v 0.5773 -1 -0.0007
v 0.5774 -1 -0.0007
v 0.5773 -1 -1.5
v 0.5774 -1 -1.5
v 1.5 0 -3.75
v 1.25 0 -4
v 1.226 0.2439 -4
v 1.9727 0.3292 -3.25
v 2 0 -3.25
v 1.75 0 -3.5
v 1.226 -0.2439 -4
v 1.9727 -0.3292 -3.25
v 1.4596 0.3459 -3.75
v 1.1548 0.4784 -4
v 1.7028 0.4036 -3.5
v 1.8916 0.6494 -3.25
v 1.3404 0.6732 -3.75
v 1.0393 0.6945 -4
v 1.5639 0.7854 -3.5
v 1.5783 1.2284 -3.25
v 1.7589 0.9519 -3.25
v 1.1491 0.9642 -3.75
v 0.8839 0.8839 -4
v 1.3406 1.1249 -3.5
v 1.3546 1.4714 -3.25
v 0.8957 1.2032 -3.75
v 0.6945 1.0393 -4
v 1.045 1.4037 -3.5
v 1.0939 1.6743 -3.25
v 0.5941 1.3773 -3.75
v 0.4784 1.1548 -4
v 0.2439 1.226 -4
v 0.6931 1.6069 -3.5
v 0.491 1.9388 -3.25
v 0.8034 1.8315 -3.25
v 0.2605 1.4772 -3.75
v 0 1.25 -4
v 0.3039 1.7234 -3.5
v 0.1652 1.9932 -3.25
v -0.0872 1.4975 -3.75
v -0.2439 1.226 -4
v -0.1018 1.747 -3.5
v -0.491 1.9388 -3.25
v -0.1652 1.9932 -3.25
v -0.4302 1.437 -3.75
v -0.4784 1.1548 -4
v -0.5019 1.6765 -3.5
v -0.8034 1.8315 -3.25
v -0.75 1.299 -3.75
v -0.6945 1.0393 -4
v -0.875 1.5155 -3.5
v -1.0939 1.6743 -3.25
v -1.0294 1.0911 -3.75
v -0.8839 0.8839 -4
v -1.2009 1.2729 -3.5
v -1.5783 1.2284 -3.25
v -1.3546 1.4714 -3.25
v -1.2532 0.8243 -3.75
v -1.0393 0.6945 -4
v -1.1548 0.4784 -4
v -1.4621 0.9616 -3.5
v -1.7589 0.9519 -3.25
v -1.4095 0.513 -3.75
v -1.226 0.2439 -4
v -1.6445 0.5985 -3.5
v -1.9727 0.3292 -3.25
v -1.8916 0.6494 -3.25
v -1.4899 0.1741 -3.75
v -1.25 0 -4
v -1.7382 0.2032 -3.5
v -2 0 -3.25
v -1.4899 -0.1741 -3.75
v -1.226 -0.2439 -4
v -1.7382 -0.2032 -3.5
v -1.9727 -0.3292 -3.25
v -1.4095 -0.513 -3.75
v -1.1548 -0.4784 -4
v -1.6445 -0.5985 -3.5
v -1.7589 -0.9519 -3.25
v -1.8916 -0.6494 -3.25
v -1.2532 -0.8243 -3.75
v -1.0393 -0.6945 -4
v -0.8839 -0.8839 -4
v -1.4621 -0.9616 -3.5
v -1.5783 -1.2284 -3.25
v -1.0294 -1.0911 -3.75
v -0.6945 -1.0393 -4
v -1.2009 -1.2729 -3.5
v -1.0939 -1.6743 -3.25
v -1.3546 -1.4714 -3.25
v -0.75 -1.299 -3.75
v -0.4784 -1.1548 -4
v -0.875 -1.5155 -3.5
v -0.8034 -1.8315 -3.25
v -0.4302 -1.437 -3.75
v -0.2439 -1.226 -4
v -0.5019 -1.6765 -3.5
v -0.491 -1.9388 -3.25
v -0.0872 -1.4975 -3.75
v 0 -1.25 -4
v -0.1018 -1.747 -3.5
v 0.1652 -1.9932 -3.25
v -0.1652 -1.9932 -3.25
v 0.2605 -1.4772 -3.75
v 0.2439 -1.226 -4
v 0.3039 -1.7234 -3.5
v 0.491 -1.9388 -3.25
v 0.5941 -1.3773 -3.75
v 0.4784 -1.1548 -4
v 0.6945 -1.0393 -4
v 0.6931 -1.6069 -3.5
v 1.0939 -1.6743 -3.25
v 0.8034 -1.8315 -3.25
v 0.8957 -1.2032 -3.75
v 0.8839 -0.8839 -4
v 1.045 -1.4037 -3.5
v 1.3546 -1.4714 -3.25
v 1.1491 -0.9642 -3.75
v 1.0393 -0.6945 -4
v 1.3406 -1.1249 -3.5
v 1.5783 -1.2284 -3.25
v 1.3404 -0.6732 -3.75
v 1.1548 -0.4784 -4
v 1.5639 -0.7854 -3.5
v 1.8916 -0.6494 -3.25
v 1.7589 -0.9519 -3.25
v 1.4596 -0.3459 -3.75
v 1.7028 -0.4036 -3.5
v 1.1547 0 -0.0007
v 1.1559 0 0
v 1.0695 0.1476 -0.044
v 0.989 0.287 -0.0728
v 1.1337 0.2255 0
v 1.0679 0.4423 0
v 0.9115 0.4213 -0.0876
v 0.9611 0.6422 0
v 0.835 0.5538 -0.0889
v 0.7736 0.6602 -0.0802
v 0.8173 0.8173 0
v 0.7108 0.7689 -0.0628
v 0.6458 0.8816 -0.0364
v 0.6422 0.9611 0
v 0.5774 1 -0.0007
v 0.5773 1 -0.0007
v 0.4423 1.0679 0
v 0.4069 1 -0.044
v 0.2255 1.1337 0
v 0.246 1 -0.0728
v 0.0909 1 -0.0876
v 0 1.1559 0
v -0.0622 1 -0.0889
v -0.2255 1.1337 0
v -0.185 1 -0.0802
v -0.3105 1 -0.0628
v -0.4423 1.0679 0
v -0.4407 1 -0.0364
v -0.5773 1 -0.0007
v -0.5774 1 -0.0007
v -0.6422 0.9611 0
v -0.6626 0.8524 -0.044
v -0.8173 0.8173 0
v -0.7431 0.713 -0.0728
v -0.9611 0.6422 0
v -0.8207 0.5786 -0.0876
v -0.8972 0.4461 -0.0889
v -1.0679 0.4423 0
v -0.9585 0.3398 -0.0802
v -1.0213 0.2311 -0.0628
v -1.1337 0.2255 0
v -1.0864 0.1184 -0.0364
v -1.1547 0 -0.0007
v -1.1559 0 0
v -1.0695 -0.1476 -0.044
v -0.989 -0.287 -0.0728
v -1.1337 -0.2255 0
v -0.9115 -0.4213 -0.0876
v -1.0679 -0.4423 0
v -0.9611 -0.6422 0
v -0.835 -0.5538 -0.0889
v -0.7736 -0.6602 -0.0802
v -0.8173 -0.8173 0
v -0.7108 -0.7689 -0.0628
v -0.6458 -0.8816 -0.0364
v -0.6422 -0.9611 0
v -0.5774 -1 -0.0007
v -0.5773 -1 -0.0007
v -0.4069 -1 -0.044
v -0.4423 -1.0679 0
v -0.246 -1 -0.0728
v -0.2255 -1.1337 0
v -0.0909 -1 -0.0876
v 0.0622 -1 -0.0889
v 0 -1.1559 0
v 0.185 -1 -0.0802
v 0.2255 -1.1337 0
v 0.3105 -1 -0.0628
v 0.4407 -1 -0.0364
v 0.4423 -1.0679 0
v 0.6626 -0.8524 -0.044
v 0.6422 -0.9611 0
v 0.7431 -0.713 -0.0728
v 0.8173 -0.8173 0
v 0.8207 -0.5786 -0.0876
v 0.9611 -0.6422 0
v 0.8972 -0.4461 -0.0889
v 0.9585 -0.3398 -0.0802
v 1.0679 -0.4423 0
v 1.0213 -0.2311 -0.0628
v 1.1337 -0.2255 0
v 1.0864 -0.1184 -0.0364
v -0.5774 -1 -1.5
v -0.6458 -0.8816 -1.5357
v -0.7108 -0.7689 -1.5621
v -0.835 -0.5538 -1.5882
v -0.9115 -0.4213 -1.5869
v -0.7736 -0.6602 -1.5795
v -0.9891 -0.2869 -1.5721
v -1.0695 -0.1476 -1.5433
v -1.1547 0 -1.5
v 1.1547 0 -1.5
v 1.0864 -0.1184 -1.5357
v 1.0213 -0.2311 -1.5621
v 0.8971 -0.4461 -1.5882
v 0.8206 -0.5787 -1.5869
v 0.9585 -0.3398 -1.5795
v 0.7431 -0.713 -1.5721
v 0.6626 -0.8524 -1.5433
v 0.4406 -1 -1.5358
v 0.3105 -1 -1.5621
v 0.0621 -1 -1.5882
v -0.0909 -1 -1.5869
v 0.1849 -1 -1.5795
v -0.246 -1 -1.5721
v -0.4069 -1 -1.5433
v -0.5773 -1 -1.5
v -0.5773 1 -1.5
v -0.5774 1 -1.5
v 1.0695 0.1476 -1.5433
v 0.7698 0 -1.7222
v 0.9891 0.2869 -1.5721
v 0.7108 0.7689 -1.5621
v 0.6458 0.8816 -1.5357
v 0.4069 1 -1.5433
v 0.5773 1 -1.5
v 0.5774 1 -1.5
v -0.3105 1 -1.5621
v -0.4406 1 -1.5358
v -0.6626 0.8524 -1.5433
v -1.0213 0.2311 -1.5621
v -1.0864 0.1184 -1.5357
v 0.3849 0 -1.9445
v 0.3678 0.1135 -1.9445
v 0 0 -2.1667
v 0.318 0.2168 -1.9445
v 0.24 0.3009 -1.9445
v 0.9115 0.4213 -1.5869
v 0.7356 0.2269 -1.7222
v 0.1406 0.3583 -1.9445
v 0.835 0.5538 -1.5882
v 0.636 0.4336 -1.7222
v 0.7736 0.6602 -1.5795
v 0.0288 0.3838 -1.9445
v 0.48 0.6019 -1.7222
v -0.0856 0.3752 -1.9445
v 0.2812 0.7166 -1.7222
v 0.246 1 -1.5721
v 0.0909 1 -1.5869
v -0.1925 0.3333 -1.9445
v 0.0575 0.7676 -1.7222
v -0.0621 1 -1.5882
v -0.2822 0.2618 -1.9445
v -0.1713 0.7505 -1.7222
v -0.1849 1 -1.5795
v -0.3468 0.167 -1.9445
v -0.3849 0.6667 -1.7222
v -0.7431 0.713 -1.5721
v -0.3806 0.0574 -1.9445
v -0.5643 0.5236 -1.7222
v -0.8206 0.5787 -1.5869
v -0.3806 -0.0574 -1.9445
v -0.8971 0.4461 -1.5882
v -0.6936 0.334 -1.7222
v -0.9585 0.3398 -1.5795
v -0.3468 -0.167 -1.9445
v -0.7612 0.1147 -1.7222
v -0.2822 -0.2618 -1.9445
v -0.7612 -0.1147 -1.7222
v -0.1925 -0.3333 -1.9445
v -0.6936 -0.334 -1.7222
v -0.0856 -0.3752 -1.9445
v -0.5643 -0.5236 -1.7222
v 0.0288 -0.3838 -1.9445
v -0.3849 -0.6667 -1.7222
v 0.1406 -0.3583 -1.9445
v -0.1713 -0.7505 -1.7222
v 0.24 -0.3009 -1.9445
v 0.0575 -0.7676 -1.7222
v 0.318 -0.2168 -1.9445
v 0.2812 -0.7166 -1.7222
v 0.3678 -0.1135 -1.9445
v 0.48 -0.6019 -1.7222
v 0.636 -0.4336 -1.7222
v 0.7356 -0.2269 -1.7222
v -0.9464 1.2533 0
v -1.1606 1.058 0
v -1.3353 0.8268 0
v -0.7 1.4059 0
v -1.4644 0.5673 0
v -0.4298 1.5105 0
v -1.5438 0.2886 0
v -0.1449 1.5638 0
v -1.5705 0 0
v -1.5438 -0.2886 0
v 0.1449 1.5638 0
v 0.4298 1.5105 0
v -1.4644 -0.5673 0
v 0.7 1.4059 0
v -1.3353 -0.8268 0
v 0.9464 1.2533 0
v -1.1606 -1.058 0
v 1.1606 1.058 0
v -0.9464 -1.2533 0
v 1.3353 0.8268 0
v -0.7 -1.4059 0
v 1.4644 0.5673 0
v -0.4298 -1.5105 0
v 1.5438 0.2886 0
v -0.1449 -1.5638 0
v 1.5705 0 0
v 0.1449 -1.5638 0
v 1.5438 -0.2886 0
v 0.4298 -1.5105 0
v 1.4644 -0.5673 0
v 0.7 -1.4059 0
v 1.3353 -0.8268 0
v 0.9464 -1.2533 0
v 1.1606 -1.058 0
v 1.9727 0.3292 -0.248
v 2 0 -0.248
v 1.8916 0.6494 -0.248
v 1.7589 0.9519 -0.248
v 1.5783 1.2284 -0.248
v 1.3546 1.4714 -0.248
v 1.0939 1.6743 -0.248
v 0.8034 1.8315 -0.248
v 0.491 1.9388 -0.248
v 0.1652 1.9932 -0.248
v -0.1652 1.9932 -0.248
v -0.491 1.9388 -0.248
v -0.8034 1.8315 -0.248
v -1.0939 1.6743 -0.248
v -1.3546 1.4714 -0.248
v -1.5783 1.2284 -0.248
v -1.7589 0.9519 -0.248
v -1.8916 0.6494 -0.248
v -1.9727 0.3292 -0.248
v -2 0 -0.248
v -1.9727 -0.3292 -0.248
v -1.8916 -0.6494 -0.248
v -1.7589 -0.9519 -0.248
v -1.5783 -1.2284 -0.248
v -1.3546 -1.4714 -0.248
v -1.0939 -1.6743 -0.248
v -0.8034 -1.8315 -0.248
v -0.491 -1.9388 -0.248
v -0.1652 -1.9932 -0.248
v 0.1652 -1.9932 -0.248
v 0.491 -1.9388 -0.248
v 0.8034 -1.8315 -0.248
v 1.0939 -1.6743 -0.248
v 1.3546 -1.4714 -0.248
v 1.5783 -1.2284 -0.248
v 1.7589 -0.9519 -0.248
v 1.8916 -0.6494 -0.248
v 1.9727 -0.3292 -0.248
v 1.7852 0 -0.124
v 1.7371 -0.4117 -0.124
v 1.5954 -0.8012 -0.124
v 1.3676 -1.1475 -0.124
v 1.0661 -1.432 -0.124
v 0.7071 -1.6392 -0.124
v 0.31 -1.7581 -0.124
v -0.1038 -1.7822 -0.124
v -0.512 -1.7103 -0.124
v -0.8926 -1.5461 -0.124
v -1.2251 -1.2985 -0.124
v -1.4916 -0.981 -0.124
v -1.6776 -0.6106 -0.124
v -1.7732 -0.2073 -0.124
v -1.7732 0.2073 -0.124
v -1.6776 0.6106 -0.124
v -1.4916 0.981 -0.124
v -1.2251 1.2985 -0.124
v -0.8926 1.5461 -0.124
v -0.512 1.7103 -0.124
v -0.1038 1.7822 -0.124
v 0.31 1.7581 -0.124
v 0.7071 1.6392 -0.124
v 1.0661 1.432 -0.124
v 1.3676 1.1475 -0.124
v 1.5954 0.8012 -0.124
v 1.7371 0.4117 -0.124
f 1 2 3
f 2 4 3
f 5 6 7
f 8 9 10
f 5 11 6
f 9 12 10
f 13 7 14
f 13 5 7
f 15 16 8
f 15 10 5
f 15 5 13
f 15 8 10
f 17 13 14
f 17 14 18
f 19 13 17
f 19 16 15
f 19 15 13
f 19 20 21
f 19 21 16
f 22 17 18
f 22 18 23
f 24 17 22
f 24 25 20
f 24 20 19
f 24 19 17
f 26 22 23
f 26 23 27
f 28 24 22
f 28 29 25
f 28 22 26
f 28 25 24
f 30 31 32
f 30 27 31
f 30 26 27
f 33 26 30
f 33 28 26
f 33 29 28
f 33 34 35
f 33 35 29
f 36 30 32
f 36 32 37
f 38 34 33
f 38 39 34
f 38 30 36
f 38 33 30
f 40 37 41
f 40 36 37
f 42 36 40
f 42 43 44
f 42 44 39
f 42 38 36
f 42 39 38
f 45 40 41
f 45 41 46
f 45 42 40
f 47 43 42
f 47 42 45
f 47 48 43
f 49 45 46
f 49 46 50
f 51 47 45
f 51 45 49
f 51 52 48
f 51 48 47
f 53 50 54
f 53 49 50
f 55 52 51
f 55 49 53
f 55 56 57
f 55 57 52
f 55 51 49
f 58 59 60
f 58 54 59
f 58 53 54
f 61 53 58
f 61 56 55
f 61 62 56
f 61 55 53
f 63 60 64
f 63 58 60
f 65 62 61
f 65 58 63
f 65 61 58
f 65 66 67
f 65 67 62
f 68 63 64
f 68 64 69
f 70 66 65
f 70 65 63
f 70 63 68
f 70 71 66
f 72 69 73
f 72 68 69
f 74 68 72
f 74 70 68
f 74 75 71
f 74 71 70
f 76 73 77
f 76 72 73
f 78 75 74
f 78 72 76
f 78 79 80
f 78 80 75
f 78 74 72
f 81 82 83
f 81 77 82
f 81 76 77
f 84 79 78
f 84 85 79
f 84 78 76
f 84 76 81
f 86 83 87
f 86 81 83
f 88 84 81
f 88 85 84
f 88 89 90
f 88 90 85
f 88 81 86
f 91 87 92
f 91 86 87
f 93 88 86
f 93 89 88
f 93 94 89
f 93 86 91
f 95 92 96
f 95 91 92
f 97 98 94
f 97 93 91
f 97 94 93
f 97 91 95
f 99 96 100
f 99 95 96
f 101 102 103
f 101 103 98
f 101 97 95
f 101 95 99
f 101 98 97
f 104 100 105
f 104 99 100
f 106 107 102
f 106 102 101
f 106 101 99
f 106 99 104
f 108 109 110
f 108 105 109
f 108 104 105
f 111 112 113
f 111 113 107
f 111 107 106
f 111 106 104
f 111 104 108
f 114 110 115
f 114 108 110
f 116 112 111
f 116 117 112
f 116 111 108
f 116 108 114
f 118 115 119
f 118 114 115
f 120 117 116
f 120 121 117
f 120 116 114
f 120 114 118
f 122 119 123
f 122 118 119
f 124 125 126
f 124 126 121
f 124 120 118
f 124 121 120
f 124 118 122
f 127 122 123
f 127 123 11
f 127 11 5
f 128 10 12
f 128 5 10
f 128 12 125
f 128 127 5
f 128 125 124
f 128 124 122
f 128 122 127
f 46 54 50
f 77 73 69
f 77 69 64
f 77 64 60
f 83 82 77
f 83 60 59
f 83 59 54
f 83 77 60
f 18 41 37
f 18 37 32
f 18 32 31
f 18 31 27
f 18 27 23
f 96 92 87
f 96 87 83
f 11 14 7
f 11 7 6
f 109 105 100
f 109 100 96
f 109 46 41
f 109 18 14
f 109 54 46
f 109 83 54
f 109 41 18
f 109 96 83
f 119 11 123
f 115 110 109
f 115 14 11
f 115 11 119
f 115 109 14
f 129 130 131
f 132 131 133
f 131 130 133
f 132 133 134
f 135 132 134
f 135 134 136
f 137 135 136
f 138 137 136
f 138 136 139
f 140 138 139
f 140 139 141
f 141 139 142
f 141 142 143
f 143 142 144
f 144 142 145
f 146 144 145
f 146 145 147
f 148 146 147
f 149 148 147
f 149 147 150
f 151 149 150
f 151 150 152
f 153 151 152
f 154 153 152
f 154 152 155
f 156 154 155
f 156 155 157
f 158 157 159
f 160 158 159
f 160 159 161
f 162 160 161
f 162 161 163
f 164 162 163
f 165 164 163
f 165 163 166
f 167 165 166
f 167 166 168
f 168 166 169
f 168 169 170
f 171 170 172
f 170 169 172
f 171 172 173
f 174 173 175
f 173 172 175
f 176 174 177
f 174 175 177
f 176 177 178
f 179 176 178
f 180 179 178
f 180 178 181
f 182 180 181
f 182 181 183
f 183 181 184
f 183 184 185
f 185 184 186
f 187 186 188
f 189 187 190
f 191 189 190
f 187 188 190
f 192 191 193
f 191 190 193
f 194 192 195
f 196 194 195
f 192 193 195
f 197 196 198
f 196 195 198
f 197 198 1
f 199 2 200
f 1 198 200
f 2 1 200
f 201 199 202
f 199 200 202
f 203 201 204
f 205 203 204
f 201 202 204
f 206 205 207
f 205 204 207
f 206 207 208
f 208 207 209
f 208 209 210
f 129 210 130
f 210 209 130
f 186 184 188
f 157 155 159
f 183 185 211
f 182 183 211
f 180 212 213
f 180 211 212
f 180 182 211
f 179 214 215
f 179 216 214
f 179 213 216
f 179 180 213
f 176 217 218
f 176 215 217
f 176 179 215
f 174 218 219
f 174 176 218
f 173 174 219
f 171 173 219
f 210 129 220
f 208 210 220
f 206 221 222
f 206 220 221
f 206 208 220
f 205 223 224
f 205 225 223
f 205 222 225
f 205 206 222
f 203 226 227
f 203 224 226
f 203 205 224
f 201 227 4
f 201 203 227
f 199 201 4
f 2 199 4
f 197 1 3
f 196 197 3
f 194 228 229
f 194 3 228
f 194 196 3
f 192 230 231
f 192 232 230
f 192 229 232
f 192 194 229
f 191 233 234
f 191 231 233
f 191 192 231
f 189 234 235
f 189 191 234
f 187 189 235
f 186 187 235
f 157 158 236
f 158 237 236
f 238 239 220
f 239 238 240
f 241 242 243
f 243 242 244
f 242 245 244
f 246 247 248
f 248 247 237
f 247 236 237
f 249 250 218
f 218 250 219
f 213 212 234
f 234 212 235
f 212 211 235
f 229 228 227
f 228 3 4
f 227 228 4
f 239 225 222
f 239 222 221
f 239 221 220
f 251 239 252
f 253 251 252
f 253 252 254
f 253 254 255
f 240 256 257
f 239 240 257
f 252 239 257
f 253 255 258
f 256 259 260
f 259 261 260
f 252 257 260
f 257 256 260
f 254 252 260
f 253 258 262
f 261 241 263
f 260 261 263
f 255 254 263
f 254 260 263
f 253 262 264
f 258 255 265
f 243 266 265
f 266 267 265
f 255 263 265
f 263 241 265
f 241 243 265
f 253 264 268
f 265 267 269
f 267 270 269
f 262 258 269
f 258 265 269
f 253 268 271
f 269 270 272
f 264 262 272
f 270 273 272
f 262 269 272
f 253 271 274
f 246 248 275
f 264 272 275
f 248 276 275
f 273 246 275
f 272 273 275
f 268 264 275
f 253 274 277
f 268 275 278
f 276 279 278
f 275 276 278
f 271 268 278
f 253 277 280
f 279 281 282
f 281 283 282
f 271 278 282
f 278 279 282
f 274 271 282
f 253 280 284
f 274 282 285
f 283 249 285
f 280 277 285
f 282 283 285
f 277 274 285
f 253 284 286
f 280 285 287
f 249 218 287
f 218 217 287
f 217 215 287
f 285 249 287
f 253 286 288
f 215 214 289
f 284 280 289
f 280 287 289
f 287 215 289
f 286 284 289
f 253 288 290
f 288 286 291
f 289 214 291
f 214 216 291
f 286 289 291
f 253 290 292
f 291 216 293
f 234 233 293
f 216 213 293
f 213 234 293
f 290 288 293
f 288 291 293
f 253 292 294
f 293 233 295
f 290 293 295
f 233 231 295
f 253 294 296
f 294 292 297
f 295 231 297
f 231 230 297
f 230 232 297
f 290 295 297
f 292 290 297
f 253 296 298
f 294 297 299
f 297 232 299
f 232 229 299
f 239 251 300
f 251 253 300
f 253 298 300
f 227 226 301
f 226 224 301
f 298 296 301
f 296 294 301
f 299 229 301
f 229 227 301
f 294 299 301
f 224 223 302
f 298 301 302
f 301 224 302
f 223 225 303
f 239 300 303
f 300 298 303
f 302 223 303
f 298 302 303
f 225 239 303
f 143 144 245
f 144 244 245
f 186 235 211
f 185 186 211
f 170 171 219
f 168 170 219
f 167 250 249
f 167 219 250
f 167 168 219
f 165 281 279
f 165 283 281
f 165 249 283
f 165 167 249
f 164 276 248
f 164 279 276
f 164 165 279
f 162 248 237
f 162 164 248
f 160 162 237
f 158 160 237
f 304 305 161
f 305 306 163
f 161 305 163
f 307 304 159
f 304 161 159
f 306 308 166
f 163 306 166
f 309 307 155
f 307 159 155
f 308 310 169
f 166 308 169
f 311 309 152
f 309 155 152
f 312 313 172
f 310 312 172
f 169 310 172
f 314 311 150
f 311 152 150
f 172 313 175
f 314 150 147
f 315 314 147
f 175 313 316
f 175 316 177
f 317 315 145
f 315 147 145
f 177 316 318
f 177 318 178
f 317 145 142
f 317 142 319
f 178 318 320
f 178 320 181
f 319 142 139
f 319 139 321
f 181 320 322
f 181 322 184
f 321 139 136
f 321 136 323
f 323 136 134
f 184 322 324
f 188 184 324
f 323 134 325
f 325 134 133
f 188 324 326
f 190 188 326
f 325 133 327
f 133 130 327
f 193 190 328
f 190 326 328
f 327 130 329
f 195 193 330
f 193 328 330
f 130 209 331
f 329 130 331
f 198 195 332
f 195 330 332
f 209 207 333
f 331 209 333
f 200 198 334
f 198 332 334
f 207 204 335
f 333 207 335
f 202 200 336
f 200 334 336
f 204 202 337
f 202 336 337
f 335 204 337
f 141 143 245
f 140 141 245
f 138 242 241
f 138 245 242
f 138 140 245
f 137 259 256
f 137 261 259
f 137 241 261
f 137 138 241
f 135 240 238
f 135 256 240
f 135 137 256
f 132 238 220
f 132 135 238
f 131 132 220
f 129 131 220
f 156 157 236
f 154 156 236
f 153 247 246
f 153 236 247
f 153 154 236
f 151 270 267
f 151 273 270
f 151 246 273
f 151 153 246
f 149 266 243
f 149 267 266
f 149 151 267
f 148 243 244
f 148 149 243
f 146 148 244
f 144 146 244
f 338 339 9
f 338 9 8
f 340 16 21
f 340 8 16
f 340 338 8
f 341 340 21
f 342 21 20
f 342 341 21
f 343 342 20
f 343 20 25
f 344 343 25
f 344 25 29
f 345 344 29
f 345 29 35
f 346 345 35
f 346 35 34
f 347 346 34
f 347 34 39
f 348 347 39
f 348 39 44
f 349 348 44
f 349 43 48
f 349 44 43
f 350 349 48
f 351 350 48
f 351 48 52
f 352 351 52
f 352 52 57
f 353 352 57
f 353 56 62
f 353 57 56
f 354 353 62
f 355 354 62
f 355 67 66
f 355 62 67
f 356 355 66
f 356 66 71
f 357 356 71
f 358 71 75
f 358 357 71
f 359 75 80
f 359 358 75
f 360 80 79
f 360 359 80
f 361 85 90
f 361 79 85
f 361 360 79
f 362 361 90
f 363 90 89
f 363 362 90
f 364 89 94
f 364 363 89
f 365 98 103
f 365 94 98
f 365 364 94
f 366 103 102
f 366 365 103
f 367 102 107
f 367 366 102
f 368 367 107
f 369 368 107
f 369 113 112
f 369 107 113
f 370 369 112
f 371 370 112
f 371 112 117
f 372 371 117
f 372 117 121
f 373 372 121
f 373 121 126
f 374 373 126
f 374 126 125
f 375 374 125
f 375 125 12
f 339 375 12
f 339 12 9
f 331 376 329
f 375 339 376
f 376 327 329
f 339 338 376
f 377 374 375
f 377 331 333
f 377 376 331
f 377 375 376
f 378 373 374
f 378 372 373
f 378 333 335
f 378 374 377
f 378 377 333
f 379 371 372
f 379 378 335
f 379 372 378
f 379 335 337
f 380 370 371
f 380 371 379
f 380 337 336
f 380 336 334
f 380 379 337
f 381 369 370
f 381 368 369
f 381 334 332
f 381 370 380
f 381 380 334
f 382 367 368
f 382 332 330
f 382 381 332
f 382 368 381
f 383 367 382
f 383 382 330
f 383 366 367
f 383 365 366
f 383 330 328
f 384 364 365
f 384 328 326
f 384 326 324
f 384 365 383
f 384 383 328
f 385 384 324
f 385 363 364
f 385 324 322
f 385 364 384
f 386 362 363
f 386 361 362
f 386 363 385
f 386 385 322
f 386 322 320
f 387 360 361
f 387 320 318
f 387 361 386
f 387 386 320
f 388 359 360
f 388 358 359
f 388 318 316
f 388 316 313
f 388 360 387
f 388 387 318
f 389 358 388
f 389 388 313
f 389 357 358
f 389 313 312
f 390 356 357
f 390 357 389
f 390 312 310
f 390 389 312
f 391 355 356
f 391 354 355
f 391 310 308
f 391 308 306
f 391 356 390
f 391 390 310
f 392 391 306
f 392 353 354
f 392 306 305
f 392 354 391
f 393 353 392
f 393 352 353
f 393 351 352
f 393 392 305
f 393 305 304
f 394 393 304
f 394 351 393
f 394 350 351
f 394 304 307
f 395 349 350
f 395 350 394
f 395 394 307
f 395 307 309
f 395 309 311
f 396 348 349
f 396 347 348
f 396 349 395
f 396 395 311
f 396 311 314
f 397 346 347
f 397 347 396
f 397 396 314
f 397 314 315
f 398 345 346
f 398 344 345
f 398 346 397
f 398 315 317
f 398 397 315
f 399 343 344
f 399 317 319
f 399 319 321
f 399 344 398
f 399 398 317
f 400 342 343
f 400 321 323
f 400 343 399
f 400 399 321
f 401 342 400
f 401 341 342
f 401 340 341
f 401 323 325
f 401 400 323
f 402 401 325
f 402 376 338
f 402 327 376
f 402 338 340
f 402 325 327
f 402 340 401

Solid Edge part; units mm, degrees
sketch "Sketch1" plane through (0, 0, 0) normal (0, -1, 0) x (1, 0, 0)
  line L0 (0, -4) -> (2, -4)
  line L1 (2, -4) -> (2, 0)
  line L2 (2, 0) -> (1.1547, 0)
  line L3 (1.1547, 0) -> (1.1547, -1.5)
  line L4 (1.1547, -1.5) -> (0, -2.1667)
  dimension "D1" = 2
  dimension "D2" = 4
  dimension "D3" = 1.5
  dimension "D4" = 1
revolve "RevolvedProtrusion1" add sketch "Sketch1" angle 360 about axis through (0, 0, -7.6667) along (0, 0, -1)
sketch "Sketch2" plane through (0, 0, 0) normal (0, 0, 1) x (1, 0, 0)
  circle A0 centre (0, 0) radius 1.5705
  line L0 (-0.5774, 1) -> (0.5774, 1)
  line L1 (0.5774, 1) -> (1.1547, 0)
  line L2 (1.1547, 0) -> (0.5774, -1)
  line L3 (0.5774, -1) -> (-0.5774, -1)
  line L4 (-0.5774, -1) -> (-1.1547, 0)
  line L5 (-1.1547, 0) -> (-0.5774, 1)
  dimension "D1" = 2
  dimension "D2" = 3.141
extrude "ExtrudedProtrusion_1" add sketch "Sketch2" against normal blind 4
sketch "Sketch3" plane through (0, 0, 0) normal (0, -1, 0) x (1, 0, 0)
  line L0 (0, -0.6673) -> (1.1559, 0)
  line L1 (1.1559, 0) -> (0, 0)
  dimension "D1" = 1.001
revolve "RevolvedCutout_1" cut sketch "Sketch3" angle 360 about axis through (0, 0, 0) along (0, 0, -1)
cosmetic_thread "Thread_1" size "M4" thread depth 4
chamfer "Chamfer_1" distance 0.4295 angle 30 1 edges at (-2, 0, 0) measured on face at (-1.3733, 1.2933, 0)
chamfer "Chamfer_2" distance 0.75 angle 45 1 edges at (-2, 0, -4) measured on face at (1.3733, 1.2933, -4)
properties material "Stahl"
